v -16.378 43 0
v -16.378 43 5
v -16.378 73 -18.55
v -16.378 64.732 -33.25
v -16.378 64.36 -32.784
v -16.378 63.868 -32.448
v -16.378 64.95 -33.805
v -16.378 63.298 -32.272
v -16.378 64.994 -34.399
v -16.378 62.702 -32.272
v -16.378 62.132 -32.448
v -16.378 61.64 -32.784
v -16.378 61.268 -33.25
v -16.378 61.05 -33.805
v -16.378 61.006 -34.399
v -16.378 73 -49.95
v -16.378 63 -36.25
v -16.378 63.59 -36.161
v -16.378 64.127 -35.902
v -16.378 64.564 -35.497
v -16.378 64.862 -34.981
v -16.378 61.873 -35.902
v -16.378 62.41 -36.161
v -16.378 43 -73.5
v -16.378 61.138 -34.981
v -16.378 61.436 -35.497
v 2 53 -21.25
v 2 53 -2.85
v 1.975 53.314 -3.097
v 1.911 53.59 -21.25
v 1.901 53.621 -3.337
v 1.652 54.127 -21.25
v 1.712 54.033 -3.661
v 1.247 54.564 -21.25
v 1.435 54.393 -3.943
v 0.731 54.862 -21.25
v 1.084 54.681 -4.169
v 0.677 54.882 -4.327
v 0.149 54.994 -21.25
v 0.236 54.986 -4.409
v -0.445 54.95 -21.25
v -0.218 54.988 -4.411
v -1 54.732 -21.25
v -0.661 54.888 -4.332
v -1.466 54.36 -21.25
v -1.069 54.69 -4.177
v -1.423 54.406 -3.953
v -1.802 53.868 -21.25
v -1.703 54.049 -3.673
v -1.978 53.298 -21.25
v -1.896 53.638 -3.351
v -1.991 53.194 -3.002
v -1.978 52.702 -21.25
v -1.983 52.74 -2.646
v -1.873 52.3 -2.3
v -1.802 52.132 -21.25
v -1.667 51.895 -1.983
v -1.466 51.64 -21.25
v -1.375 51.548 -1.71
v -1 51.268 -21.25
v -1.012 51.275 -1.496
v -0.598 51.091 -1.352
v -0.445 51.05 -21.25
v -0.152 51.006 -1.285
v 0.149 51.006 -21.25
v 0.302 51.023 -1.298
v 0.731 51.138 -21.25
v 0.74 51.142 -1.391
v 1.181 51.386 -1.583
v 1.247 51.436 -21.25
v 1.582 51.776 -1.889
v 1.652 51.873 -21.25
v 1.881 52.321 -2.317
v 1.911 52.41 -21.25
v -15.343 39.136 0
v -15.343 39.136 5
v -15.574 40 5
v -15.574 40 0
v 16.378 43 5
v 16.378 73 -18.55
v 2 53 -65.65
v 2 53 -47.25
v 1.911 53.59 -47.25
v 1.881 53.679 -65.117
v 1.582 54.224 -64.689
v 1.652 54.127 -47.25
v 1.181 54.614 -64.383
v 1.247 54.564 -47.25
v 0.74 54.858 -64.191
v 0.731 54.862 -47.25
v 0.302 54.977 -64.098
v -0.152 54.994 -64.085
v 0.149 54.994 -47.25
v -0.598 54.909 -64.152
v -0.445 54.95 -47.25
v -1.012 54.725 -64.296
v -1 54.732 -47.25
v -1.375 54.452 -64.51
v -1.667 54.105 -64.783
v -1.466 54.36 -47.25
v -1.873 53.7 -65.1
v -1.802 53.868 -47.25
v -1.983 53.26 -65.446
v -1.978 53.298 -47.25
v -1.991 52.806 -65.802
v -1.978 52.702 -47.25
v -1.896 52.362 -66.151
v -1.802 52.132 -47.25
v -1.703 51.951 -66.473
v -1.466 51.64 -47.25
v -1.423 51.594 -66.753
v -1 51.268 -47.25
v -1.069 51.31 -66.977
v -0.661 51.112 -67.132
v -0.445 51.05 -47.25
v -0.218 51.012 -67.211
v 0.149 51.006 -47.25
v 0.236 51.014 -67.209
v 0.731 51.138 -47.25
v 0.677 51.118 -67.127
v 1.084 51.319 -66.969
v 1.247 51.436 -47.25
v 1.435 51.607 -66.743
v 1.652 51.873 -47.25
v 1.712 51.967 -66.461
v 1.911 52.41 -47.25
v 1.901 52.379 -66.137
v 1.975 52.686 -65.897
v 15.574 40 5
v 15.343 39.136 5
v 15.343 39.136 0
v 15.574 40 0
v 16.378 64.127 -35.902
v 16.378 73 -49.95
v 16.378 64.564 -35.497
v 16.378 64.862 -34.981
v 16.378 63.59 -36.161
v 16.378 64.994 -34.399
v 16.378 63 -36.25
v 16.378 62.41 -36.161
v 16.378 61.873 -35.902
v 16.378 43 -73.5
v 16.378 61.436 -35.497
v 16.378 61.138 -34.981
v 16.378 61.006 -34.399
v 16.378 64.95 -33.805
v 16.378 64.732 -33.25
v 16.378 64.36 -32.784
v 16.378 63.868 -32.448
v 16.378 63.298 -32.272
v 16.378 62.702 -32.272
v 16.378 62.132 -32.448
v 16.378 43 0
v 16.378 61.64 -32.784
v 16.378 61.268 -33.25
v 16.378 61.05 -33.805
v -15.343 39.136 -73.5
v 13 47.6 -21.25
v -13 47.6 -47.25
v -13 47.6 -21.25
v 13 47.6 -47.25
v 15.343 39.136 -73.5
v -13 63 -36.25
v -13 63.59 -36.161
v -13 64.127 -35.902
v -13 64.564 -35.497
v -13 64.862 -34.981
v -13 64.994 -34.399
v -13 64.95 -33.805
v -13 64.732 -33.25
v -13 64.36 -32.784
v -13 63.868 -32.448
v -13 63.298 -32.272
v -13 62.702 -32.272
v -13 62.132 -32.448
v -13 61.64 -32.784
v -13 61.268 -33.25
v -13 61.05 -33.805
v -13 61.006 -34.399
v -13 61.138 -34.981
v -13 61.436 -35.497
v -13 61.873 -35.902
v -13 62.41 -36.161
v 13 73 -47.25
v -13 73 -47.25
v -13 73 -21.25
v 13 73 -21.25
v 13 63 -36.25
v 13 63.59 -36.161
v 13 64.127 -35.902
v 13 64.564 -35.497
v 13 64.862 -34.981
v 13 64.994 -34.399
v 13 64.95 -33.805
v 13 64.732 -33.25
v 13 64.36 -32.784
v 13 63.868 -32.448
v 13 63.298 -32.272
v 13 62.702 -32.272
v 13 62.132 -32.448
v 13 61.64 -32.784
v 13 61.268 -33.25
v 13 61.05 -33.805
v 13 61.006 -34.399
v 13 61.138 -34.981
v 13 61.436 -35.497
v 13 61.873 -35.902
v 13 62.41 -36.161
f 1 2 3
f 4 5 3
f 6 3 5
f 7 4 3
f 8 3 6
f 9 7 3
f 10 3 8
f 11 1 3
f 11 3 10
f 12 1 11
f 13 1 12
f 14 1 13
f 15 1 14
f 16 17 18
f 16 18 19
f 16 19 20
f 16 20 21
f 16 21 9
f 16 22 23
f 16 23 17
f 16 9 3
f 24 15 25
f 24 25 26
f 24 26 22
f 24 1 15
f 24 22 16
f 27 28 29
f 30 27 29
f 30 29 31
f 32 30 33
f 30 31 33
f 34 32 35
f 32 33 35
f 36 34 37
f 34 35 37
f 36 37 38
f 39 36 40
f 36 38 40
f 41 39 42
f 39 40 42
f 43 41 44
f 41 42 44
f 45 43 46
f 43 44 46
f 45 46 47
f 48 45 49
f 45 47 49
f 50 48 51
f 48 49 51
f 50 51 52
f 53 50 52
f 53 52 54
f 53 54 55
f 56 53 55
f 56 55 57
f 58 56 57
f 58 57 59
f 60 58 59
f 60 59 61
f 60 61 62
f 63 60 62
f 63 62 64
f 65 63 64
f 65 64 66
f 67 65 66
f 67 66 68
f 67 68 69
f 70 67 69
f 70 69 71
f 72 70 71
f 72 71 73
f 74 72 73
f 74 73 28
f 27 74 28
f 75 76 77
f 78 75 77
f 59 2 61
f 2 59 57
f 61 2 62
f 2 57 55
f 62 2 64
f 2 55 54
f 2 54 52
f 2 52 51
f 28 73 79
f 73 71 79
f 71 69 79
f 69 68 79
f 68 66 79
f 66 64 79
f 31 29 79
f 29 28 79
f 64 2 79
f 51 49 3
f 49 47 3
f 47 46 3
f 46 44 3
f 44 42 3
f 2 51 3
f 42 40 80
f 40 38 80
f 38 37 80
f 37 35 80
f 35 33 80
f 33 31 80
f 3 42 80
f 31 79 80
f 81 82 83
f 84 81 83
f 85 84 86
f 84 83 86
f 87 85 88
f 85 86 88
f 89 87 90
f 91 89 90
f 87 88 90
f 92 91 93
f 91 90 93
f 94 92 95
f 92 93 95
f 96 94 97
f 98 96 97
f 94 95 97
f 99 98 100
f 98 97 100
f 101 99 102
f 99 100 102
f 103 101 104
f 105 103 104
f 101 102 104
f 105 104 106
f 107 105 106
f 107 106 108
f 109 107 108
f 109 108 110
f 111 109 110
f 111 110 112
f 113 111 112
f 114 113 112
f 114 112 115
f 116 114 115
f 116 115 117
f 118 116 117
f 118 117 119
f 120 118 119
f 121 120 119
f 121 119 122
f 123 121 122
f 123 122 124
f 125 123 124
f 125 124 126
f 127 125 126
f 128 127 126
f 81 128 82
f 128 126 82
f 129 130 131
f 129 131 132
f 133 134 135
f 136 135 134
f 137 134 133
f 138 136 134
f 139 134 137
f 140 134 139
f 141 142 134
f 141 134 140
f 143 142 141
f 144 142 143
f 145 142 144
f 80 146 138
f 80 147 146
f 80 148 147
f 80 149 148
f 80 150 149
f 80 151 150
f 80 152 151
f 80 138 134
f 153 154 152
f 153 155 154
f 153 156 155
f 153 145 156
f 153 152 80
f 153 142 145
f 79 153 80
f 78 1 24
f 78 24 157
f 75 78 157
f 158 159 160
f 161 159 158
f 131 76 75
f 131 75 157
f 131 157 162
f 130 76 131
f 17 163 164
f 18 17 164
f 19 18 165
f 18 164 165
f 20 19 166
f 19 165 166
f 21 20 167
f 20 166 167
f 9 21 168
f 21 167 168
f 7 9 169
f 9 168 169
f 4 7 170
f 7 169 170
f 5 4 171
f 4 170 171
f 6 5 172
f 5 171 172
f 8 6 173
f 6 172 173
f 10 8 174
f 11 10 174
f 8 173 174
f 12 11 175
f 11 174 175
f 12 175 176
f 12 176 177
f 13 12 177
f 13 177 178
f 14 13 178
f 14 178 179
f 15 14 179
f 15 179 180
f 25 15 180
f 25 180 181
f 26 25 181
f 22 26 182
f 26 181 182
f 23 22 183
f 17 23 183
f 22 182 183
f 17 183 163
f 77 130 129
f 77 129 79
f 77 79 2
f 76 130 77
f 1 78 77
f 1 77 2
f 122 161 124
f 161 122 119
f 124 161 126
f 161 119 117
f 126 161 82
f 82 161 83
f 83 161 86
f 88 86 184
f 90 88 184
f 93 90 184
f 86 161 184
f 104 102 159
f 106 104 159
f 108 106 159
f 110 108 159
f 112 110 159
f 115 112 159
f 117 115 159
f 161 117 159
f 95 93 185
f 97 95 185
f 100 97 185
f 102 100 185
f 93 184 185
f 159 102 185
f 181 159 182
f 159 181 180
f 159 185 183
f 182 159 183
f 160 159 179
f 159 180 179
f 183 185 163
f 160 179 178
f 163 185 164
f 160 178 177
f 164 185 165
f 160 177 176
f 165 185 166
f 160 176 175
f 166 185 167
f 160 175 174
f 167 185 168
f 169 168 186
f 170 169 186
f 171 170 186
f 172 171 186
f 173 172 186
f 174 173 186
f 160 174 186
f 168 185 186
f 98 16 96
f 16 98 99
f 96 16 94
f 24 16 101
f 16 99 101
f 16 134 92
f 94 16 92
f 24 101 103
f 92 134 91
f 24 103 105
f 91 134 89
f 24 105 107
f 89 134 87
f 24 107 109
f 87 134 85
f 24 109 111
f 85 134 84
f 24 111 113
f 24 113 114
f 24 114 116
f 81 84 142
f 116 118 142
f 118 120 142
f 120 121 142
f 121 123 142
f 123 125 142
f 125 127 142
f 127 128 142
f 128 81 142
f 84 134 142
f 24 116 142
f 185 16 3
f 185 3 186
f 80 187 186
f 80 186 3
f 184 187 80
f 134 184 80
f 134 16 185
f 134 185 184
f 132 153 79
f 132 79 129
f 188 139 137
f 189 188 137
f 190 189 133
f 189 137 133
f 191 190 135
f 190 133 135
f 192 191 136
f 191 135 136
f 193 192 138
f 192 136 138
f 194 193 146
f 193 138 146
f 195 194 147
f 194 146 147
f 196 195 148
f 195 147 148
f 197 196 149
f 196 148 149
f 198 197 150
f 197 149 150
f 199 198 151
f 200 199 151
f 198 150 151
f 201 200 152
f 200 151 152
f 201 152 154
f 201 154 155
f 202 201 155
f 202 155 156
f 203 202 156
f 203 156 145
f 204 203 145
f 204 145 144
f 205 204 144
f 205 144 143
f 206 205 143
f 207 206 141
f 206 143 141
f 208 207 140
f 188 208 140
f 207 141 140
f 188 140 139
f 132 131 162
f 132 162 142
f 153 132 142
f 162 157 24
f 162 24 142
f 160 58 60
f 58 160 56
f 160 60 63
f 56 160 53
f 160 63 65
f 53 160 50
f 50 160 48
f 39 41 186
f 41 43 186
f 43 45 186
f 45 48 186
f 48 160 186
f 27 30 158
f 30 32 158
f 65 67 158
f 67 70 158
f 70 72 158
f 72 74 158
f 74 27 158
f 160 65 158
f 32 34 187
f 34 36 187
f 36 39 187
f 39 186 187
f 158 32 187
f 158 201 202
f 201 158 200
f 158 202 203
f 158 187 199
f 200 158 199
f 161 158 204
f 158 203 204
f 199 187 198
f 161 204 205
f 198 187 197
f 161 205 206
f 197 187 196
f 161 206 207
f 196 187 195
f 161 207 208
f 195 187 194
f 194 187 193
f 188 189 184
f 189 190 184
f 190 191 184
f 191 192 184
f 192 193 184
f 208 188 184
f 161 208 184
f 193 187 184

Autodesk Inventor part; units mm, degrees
ref_plane "YZ Plane" through (0, 0, 0) normal (1, 0, 0) x (0, 1, 0)
ref_plane "XZ Plane" through (0, 0, 0) normal (0, 1, 0) x (-1, 0, 0)
sketch "Sketch1" plane through (0, 0, 0) normal (0, 0, 1) x (1, 0, 0)
  circle A0 centre (0, 4) radius 2
  circle A1 centre (-4, 0) radius 2
  circle A2 centre (0, -4) radius 2
  circle A3 centre (4, 0) radius 2
  line L0 (8, 11.7321) -> (15.5744, 40)
  line L1 (7, 8) -> (40.1288, 8) construction
  line L2 (-8, 11.7321) -> (-15.5744, 40)
  line L3 (8, 0) -> (8, 11.7321)
  line L4 (-8, 0) -> (-8, 11.7321)
  arc A4 (-8, 0) -> (8, 0) centre (0, 0) ccw
  line L5 (0, 43) -> (16.3782, 43)
  line L6 (16.3782, 43) -> (15.5744, 40)
  line L7 (-15.5744, 40) -> (-16.3782, 43)
  line L8 (-16.3782, 43) -> (0, 43)
  dimension "d2" = 4
  dimension "d5" = 360
extrude "Extrusion1" add sketch "Sketch1" along normal blind 5
sketch "Sketch2" plane through (0, 0, 0) normal (0, 0, -1) x (-1, 0, 0)
  circle A0 centre (0, 0) radius 6.625
  dimension "d18" = 13.25
extrude "Extrusion2" cut sketch "Sketch2" against normal blind 2
sketch "Sketch4" plane through (0, 0, 0) normal (0, 0, -1) x (-1, 0, 0)
  line L0 (-8, 11.7321) -> (-16.3782, 43) projected
  line L1 (-16.3782, 43) -> (16.3782, 43) projected
  line L2 (-16.3782, 43) -> (16.3782, 43)
  line L3 (0, 39.136) -> (15.3429, 39.136)
  line L4 (16.3782, 43) -> (8, 11.7321) projected
  line L5 (15.3429, 39.136) -> (16.3782, 43)
  line L6 (0, 39.136) -> (-15.3429, 39.136)
  line L7 (-15.3429, 39.136) -> (-16.3782, 43)
  point P0 (0, 0)
extrude "Extrusion4" add sketch "Sketch4" along normal blind 73.5
sketch "Sketch5" plane through (-16.3782, 43, 5) normal (0, 1, 0) x (1, 0, 0)
  line L0 (0, 78.5) -> (32.7564, 78.5) projected
  line L1 (32.7564, 0) -> (0, 0) projected
  line L2 (0, 78.5) -> (32.7564, 78.5)
  line L3 (32.7564, 78.5) -> (32.7564, 0)
  line L4 (32.7564, 0) -> (0, 0)
  line L5 (0, 0) -> (0, 78.5)
  point P0 (16.3782, 5)
extrude "Extrusion5" add sketch "Sketch5" along normal blind 30
sketch "Sketch6" plane through (16.3782, 43, -73.5) normal (1, 0, 0) x (0, 0, -1)
  line L0 (-78.5, 30) -> (0, 30) projected
  line L1 (-39.25, 30) -> (-26.55, 30)
  line L2 (-39.25, 30) -> (-51.95, 30)
  line L3 (-51.95, 30) -> (-54.95, 30)
  line L4 (-26.55, 30) -> (-23.55, 30)
  line L5 (0, -3.864) -> (0, 0) projected
  line L6 (-23.55, 30) -> (0, 0)
  line L7 (0, 0) -> (0, 30) projected
  line L8 (0, 0) -> (0, 30)
  line L9 (0, 30) -> (-23.55, 30)
  line L10 (-54.95, 30) -> (-78.5, 30)
  line L11 (-78.5, 0) -> (-78.5, 30) projected
  line L12 (-78.5, 30) -> (-78.5, 0)
  line L13 (-78.5, 0) -> (-54.95, 30)
  point P0 (-73.5, -43)
  dimension "d30" = 12.7
  dimension "d31" = 12.7
  dimension "d32" = 3
  dimension "d33" = 3
extrude "Extrusion6" cut sketch "Sketch6" against normal up to surface (32.7564 mm away)
sketch "Sketch7" plane through (-16.3782, 73, 5) normal (0, 1, 0) x (1, 0, 0)
  line L0 (0, 78.5) -> (0, 0) projected
  line L1 (0, 23.55) -> (32.7564, 23.55) projected
  line L2 (16.3782, 52.25) -> (3.3782, 52.25)
  line L3 (3.3782, 52.25) -> (3.3782, 26.25)
  line L4 (3.3782, 26.25) -> (29.3782, 26.25)
  line L5 (29.3782, 26.25) -> (29.3782, 52.25)
  line L6 (29.3782, 52.25) -> (16.3782, 52.25)
  point P0 (16.3782, 5)
  dimension "d37" = 13
  dimension "d38" = 26
  dimension "d39" = 26
extrude "Extrusion7" cut sketch "Sketch7" against normal blind 25.4
ref_plane "Work Plane1" through (0, 0, 2.5) normal (0, 0, 1) x (1, 0, 0)
sketch "Sketch8" plane through (0, 0, 2.5) normal (0, 0, 1) x (1, 0, 0)
  line L0 (16.3782, 43) -> (-16.3782, 43) projected
  circle A0 centre (0, 53) radius 2
  point P0 (0, 0)
  dimension "d43" = 4
extrude "Extrusion8" cut sketch "Sketch8" against normal through all
sketch "Sketch9" plane through (16.3782, 43, 5) normal (1, 0, 0) x (0, 0, -1)
  line L0 (26.25, 30) -> (52.25, 30) projected
  circle A0 centre (39.25, 20) radius 2
  point P0 (5, -43)
  dimension "d47" = 4
extrude "Extrusion9" cut sketch "Sketch9" against normal up to surface (32.7564 mm away)
sketch "Sketch10" plane through (8, 0, 0) normal (1, 0, 0) x (0, 0, -1)
  line L0 (0, 39.136) -> (73.5, 39.136) projected
  line L1 (-5, 0) -> (-5, -8) projected
  line L2 (0, 39.136) -> (-5, 39.136)
  line L3 (-5, 39.136) -> (-5, -8)
  line L4 (-5, -8) -> (0, -8)
  line L5 (0, -8) -> (0, 39.136)
  point P0 (0, 0)
extrude "Extrusion10" cut sketch "Sketch10" along normal blind 10 and the other way blind 25
properties part number "Second_Tilt_Motor_Mount"
